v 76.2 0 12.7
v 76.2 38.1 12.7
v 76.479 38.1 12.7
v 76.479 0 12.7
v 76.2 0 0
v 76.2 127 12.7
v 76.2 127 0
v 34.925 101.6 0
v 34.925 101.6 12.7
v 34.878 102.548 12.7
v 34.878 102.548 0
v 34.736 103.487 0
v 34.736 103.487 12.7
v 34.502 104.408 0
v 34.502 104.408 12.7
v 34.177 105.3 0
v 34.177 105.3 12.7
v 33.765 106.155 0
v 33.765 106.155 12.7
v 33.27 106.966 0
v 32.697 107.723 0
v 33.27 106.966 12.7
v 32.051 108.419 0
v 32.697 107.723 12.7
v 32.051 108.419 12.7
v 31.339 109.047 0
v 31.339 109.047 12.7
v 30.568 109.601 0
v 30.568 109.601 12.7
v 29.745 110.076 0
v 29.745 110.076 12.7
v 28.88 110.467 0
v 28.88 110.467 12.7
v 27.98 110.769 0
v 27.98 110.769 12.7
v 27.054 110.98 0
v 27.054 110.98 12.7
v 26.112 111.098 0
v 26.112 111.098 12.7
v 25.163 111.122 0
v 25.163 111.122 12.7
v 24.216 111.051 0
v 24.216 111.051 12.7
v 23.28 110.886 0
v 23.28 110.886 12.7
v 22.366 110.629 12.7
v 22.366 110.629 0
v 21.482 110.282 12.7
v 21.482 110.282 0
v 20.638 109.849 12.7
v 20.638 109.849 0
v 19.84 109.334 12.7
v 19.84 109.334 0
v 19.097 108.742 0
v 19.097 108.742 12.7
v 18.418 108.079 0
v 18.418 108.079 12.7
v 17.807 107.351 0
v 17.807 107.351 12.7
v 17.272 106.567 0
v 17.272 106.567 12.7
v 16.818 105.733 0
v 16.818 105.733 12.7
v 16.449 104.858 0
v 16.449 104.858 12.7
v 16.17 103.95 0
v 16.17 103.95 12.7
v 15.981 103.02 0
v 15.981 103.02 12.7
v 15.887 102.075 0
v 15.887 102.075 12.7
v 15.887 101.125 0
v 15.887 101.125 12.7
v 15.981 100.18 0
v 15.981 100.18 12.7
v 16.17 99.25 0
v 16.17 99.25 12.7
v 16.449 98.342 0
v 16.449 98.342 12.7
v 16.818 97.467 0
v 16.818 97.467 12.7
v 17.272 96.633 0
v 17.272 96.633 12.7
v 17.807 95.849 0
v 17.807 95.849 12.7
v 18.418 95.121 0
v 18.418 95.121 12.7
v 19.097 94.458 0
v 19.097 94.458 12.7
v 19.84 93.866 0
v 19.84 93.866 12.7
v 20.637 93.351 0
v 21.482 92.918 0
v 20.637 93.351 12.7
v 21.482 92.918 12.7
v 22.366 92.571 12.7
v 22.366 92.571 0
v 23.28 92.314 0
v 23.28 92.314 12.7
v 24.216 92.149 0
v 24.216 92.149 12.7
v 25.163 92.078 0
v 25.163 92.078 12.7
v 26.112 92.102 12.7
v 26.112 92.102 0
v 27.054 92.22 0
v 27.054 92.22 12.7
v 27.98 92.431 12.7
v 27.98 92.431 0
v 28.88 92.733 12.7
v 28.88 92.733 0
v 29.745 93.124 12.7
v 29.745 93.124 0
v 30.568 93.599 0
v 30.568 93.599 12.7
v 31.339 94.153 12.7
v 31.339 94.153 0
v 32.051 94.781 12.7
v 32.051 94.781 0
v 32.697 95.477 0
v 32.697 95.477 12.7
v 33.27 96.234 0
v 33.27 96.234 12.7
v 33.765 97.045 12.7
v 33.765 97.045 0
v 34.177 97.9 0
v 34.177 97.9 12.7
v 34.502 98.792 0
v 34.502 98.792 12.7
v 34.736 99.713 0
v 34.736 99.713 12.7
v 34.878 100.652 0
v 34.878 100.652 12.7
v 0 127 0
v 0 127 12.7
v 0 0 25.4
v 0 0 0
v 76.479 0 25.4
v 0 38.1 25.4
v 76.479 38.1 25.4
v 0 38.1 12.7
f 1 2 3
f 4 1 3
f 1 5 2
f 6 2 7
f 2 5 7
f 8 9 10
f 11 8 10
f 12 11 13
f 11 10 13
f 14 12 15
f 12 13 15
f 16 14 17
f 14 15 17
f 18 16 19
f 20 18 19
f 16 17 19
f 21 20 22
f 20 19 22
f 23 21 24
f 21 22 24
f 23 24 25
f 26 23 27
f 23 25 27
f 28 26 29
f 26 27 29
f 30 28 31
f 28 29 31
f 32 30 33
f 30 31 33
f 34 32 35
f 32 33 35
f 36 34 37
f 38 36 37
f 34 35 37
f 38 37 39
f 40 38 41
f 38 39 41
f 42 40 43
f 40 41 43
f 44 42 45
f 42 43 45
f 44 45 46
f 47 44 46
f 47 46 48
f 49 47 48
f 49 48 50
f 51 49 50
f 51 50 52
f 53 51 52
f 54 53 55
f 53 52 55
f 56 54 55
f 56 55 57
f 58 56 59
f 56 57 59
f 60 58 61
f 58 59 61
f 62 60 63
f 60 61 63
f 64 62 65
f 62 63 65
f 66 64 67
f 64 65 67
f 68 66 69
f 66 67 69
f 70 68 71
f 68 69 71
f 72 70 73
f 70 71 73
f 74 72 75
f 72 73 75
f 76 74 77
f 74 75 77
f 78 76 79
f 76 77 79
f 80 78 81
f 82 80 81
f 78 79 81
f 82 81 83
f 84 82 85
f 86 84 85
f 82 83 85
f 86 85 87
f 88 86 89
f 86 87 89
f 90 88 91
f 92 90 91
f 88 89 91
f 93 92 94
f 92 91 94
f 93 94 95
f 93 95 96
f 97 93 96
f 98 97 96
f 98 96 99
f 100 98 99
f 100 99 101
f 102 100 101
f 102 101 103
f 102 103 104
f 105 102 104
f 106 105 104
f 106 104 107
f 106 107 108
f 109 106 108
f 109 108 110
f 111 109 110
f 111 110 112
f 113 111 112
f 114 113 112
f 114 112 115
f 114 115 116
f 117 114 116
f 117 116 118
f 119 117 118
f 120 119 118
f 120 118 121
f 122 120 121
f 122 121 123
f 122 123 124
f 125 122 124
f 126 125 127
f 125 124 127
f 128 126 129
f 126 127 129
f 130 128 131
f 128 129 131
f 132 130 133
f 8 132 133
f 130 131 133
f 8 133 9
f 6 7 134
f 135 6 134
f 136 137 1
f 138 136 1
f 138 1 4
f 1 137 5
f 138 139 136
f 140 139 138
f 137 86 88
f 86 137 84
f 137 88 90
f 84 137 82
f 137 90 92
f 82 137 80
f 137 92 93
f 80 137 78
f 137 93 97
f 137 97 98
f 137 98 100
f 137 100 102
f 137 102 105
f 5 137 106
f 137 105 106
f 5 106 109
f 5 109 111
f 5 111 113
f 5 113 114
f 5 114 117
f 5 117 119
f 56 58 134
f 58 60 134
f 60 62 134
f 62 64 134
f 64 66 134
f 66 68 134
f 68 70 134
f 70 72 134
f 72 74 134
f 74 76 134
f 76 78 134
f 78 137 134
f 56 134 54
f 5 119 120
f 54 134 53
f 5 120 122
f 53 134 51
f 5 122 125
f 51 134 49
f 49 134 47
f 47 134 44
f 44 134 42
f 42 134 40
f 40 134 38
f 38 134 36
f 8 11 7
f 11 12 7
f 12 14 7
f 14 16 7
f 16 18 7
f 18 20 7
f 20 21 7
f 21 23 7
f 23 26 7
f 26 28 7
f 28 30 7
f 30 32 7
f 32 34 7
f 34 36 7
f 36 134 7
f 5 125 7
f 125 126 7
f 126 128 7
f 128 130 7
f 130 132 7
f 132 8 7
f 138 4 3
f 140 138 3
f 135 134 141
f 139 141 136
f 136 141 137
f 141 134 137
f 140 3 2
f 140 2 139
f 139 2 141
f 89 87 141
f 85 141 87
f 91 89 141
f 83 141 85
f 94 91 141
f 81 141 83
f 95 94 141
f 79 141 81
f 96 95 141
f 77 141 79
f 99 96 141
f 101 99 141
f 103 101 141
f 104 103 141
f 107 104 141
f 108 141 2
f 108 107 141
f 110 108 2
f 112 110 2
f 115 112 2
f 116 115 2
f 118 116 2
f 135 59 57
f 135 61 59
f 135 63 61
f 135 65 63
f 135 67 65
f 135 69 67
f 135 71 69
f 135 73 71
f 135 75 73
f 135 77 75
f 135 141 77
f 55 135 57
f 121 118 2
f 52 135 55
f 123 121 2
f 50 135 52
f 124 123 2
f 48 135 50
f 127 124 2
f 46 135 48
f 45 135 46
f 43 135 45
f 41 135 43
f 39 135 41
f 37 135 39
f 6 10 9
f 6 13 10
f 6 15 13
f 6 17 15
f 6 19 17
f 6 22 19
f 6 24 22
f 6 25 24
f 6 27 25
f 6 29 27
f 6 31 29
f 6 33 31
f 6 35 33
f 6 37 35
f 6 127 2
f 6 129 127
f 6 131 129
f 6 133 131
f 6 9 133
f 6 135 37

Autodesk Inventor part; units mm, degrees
ref_plane "YZ Plane" through (0, 0, 0) normal (1, 0, 0) x (0, 1, 0)
ref_plane "XZ Plane" through (0, 0, 0) normal (0, 1, 0) x (-1, 0, 0)
ref_plane "XY Plane" through (0, 0, 0) normal (0, 0, 1) x (1, 0, 0)
sketch "Sketch1" plane through (0, 0, 0) normal (0, 0, 1) x (1, 0, 0)
  line L0 (0, 0) -> (76.2, 0)
  line L1 (76.2, 0) -> (76.2, 127)
  line L2 (76.2, 127) -> (0, 127)
  line L3 (0, 127) -> (0, 0)
  dimension "d0" = 76.2
  dimension "d1" = 127
extrude "Extrusion1" add sketch "Sketch1" along normal blind 12.7
sketch "Sketch2" plane through (0, 0, 12.7) normal (0, 0, 1) x (1, 0, 0)
  line L0 (0, 0) -> (76.4787, 0)
  line L1 (76.4787, 0) -> (76.4787, 38.1)
  line L2 (76.4787, 38.1) -> (0, 38.1)
  line L3 (0, 38.1) -> (0, 0)
  dimension "d4" = 38.1
extrude "Extrusion2" add sketch "Sketch2" along normal blind 12.7
sketch "Sketch3" plane through (0, 0, 12.7) normal (0, 0, 1) x (1, 0, 0)
  circle A0 centre (25.4, 101.6) radius 9.525
  line L0 (0, 127) -> (0, 38.1) projected
  line L1 (76.2, 127) -> (0, 127) projected
  point P0 (0, 0)
  dimension "d7" = 19.05
  dimension "d8" = 25.4
  dimension "d9" = 25.4
extrude "Extrusion3" cut sketch "Sketch3" against normal through all
sketch "Sketch4" plane through (0, 127, 0) normal (0, 1, 0) x (1, 0, 0)
  point P0 (0, 0)
